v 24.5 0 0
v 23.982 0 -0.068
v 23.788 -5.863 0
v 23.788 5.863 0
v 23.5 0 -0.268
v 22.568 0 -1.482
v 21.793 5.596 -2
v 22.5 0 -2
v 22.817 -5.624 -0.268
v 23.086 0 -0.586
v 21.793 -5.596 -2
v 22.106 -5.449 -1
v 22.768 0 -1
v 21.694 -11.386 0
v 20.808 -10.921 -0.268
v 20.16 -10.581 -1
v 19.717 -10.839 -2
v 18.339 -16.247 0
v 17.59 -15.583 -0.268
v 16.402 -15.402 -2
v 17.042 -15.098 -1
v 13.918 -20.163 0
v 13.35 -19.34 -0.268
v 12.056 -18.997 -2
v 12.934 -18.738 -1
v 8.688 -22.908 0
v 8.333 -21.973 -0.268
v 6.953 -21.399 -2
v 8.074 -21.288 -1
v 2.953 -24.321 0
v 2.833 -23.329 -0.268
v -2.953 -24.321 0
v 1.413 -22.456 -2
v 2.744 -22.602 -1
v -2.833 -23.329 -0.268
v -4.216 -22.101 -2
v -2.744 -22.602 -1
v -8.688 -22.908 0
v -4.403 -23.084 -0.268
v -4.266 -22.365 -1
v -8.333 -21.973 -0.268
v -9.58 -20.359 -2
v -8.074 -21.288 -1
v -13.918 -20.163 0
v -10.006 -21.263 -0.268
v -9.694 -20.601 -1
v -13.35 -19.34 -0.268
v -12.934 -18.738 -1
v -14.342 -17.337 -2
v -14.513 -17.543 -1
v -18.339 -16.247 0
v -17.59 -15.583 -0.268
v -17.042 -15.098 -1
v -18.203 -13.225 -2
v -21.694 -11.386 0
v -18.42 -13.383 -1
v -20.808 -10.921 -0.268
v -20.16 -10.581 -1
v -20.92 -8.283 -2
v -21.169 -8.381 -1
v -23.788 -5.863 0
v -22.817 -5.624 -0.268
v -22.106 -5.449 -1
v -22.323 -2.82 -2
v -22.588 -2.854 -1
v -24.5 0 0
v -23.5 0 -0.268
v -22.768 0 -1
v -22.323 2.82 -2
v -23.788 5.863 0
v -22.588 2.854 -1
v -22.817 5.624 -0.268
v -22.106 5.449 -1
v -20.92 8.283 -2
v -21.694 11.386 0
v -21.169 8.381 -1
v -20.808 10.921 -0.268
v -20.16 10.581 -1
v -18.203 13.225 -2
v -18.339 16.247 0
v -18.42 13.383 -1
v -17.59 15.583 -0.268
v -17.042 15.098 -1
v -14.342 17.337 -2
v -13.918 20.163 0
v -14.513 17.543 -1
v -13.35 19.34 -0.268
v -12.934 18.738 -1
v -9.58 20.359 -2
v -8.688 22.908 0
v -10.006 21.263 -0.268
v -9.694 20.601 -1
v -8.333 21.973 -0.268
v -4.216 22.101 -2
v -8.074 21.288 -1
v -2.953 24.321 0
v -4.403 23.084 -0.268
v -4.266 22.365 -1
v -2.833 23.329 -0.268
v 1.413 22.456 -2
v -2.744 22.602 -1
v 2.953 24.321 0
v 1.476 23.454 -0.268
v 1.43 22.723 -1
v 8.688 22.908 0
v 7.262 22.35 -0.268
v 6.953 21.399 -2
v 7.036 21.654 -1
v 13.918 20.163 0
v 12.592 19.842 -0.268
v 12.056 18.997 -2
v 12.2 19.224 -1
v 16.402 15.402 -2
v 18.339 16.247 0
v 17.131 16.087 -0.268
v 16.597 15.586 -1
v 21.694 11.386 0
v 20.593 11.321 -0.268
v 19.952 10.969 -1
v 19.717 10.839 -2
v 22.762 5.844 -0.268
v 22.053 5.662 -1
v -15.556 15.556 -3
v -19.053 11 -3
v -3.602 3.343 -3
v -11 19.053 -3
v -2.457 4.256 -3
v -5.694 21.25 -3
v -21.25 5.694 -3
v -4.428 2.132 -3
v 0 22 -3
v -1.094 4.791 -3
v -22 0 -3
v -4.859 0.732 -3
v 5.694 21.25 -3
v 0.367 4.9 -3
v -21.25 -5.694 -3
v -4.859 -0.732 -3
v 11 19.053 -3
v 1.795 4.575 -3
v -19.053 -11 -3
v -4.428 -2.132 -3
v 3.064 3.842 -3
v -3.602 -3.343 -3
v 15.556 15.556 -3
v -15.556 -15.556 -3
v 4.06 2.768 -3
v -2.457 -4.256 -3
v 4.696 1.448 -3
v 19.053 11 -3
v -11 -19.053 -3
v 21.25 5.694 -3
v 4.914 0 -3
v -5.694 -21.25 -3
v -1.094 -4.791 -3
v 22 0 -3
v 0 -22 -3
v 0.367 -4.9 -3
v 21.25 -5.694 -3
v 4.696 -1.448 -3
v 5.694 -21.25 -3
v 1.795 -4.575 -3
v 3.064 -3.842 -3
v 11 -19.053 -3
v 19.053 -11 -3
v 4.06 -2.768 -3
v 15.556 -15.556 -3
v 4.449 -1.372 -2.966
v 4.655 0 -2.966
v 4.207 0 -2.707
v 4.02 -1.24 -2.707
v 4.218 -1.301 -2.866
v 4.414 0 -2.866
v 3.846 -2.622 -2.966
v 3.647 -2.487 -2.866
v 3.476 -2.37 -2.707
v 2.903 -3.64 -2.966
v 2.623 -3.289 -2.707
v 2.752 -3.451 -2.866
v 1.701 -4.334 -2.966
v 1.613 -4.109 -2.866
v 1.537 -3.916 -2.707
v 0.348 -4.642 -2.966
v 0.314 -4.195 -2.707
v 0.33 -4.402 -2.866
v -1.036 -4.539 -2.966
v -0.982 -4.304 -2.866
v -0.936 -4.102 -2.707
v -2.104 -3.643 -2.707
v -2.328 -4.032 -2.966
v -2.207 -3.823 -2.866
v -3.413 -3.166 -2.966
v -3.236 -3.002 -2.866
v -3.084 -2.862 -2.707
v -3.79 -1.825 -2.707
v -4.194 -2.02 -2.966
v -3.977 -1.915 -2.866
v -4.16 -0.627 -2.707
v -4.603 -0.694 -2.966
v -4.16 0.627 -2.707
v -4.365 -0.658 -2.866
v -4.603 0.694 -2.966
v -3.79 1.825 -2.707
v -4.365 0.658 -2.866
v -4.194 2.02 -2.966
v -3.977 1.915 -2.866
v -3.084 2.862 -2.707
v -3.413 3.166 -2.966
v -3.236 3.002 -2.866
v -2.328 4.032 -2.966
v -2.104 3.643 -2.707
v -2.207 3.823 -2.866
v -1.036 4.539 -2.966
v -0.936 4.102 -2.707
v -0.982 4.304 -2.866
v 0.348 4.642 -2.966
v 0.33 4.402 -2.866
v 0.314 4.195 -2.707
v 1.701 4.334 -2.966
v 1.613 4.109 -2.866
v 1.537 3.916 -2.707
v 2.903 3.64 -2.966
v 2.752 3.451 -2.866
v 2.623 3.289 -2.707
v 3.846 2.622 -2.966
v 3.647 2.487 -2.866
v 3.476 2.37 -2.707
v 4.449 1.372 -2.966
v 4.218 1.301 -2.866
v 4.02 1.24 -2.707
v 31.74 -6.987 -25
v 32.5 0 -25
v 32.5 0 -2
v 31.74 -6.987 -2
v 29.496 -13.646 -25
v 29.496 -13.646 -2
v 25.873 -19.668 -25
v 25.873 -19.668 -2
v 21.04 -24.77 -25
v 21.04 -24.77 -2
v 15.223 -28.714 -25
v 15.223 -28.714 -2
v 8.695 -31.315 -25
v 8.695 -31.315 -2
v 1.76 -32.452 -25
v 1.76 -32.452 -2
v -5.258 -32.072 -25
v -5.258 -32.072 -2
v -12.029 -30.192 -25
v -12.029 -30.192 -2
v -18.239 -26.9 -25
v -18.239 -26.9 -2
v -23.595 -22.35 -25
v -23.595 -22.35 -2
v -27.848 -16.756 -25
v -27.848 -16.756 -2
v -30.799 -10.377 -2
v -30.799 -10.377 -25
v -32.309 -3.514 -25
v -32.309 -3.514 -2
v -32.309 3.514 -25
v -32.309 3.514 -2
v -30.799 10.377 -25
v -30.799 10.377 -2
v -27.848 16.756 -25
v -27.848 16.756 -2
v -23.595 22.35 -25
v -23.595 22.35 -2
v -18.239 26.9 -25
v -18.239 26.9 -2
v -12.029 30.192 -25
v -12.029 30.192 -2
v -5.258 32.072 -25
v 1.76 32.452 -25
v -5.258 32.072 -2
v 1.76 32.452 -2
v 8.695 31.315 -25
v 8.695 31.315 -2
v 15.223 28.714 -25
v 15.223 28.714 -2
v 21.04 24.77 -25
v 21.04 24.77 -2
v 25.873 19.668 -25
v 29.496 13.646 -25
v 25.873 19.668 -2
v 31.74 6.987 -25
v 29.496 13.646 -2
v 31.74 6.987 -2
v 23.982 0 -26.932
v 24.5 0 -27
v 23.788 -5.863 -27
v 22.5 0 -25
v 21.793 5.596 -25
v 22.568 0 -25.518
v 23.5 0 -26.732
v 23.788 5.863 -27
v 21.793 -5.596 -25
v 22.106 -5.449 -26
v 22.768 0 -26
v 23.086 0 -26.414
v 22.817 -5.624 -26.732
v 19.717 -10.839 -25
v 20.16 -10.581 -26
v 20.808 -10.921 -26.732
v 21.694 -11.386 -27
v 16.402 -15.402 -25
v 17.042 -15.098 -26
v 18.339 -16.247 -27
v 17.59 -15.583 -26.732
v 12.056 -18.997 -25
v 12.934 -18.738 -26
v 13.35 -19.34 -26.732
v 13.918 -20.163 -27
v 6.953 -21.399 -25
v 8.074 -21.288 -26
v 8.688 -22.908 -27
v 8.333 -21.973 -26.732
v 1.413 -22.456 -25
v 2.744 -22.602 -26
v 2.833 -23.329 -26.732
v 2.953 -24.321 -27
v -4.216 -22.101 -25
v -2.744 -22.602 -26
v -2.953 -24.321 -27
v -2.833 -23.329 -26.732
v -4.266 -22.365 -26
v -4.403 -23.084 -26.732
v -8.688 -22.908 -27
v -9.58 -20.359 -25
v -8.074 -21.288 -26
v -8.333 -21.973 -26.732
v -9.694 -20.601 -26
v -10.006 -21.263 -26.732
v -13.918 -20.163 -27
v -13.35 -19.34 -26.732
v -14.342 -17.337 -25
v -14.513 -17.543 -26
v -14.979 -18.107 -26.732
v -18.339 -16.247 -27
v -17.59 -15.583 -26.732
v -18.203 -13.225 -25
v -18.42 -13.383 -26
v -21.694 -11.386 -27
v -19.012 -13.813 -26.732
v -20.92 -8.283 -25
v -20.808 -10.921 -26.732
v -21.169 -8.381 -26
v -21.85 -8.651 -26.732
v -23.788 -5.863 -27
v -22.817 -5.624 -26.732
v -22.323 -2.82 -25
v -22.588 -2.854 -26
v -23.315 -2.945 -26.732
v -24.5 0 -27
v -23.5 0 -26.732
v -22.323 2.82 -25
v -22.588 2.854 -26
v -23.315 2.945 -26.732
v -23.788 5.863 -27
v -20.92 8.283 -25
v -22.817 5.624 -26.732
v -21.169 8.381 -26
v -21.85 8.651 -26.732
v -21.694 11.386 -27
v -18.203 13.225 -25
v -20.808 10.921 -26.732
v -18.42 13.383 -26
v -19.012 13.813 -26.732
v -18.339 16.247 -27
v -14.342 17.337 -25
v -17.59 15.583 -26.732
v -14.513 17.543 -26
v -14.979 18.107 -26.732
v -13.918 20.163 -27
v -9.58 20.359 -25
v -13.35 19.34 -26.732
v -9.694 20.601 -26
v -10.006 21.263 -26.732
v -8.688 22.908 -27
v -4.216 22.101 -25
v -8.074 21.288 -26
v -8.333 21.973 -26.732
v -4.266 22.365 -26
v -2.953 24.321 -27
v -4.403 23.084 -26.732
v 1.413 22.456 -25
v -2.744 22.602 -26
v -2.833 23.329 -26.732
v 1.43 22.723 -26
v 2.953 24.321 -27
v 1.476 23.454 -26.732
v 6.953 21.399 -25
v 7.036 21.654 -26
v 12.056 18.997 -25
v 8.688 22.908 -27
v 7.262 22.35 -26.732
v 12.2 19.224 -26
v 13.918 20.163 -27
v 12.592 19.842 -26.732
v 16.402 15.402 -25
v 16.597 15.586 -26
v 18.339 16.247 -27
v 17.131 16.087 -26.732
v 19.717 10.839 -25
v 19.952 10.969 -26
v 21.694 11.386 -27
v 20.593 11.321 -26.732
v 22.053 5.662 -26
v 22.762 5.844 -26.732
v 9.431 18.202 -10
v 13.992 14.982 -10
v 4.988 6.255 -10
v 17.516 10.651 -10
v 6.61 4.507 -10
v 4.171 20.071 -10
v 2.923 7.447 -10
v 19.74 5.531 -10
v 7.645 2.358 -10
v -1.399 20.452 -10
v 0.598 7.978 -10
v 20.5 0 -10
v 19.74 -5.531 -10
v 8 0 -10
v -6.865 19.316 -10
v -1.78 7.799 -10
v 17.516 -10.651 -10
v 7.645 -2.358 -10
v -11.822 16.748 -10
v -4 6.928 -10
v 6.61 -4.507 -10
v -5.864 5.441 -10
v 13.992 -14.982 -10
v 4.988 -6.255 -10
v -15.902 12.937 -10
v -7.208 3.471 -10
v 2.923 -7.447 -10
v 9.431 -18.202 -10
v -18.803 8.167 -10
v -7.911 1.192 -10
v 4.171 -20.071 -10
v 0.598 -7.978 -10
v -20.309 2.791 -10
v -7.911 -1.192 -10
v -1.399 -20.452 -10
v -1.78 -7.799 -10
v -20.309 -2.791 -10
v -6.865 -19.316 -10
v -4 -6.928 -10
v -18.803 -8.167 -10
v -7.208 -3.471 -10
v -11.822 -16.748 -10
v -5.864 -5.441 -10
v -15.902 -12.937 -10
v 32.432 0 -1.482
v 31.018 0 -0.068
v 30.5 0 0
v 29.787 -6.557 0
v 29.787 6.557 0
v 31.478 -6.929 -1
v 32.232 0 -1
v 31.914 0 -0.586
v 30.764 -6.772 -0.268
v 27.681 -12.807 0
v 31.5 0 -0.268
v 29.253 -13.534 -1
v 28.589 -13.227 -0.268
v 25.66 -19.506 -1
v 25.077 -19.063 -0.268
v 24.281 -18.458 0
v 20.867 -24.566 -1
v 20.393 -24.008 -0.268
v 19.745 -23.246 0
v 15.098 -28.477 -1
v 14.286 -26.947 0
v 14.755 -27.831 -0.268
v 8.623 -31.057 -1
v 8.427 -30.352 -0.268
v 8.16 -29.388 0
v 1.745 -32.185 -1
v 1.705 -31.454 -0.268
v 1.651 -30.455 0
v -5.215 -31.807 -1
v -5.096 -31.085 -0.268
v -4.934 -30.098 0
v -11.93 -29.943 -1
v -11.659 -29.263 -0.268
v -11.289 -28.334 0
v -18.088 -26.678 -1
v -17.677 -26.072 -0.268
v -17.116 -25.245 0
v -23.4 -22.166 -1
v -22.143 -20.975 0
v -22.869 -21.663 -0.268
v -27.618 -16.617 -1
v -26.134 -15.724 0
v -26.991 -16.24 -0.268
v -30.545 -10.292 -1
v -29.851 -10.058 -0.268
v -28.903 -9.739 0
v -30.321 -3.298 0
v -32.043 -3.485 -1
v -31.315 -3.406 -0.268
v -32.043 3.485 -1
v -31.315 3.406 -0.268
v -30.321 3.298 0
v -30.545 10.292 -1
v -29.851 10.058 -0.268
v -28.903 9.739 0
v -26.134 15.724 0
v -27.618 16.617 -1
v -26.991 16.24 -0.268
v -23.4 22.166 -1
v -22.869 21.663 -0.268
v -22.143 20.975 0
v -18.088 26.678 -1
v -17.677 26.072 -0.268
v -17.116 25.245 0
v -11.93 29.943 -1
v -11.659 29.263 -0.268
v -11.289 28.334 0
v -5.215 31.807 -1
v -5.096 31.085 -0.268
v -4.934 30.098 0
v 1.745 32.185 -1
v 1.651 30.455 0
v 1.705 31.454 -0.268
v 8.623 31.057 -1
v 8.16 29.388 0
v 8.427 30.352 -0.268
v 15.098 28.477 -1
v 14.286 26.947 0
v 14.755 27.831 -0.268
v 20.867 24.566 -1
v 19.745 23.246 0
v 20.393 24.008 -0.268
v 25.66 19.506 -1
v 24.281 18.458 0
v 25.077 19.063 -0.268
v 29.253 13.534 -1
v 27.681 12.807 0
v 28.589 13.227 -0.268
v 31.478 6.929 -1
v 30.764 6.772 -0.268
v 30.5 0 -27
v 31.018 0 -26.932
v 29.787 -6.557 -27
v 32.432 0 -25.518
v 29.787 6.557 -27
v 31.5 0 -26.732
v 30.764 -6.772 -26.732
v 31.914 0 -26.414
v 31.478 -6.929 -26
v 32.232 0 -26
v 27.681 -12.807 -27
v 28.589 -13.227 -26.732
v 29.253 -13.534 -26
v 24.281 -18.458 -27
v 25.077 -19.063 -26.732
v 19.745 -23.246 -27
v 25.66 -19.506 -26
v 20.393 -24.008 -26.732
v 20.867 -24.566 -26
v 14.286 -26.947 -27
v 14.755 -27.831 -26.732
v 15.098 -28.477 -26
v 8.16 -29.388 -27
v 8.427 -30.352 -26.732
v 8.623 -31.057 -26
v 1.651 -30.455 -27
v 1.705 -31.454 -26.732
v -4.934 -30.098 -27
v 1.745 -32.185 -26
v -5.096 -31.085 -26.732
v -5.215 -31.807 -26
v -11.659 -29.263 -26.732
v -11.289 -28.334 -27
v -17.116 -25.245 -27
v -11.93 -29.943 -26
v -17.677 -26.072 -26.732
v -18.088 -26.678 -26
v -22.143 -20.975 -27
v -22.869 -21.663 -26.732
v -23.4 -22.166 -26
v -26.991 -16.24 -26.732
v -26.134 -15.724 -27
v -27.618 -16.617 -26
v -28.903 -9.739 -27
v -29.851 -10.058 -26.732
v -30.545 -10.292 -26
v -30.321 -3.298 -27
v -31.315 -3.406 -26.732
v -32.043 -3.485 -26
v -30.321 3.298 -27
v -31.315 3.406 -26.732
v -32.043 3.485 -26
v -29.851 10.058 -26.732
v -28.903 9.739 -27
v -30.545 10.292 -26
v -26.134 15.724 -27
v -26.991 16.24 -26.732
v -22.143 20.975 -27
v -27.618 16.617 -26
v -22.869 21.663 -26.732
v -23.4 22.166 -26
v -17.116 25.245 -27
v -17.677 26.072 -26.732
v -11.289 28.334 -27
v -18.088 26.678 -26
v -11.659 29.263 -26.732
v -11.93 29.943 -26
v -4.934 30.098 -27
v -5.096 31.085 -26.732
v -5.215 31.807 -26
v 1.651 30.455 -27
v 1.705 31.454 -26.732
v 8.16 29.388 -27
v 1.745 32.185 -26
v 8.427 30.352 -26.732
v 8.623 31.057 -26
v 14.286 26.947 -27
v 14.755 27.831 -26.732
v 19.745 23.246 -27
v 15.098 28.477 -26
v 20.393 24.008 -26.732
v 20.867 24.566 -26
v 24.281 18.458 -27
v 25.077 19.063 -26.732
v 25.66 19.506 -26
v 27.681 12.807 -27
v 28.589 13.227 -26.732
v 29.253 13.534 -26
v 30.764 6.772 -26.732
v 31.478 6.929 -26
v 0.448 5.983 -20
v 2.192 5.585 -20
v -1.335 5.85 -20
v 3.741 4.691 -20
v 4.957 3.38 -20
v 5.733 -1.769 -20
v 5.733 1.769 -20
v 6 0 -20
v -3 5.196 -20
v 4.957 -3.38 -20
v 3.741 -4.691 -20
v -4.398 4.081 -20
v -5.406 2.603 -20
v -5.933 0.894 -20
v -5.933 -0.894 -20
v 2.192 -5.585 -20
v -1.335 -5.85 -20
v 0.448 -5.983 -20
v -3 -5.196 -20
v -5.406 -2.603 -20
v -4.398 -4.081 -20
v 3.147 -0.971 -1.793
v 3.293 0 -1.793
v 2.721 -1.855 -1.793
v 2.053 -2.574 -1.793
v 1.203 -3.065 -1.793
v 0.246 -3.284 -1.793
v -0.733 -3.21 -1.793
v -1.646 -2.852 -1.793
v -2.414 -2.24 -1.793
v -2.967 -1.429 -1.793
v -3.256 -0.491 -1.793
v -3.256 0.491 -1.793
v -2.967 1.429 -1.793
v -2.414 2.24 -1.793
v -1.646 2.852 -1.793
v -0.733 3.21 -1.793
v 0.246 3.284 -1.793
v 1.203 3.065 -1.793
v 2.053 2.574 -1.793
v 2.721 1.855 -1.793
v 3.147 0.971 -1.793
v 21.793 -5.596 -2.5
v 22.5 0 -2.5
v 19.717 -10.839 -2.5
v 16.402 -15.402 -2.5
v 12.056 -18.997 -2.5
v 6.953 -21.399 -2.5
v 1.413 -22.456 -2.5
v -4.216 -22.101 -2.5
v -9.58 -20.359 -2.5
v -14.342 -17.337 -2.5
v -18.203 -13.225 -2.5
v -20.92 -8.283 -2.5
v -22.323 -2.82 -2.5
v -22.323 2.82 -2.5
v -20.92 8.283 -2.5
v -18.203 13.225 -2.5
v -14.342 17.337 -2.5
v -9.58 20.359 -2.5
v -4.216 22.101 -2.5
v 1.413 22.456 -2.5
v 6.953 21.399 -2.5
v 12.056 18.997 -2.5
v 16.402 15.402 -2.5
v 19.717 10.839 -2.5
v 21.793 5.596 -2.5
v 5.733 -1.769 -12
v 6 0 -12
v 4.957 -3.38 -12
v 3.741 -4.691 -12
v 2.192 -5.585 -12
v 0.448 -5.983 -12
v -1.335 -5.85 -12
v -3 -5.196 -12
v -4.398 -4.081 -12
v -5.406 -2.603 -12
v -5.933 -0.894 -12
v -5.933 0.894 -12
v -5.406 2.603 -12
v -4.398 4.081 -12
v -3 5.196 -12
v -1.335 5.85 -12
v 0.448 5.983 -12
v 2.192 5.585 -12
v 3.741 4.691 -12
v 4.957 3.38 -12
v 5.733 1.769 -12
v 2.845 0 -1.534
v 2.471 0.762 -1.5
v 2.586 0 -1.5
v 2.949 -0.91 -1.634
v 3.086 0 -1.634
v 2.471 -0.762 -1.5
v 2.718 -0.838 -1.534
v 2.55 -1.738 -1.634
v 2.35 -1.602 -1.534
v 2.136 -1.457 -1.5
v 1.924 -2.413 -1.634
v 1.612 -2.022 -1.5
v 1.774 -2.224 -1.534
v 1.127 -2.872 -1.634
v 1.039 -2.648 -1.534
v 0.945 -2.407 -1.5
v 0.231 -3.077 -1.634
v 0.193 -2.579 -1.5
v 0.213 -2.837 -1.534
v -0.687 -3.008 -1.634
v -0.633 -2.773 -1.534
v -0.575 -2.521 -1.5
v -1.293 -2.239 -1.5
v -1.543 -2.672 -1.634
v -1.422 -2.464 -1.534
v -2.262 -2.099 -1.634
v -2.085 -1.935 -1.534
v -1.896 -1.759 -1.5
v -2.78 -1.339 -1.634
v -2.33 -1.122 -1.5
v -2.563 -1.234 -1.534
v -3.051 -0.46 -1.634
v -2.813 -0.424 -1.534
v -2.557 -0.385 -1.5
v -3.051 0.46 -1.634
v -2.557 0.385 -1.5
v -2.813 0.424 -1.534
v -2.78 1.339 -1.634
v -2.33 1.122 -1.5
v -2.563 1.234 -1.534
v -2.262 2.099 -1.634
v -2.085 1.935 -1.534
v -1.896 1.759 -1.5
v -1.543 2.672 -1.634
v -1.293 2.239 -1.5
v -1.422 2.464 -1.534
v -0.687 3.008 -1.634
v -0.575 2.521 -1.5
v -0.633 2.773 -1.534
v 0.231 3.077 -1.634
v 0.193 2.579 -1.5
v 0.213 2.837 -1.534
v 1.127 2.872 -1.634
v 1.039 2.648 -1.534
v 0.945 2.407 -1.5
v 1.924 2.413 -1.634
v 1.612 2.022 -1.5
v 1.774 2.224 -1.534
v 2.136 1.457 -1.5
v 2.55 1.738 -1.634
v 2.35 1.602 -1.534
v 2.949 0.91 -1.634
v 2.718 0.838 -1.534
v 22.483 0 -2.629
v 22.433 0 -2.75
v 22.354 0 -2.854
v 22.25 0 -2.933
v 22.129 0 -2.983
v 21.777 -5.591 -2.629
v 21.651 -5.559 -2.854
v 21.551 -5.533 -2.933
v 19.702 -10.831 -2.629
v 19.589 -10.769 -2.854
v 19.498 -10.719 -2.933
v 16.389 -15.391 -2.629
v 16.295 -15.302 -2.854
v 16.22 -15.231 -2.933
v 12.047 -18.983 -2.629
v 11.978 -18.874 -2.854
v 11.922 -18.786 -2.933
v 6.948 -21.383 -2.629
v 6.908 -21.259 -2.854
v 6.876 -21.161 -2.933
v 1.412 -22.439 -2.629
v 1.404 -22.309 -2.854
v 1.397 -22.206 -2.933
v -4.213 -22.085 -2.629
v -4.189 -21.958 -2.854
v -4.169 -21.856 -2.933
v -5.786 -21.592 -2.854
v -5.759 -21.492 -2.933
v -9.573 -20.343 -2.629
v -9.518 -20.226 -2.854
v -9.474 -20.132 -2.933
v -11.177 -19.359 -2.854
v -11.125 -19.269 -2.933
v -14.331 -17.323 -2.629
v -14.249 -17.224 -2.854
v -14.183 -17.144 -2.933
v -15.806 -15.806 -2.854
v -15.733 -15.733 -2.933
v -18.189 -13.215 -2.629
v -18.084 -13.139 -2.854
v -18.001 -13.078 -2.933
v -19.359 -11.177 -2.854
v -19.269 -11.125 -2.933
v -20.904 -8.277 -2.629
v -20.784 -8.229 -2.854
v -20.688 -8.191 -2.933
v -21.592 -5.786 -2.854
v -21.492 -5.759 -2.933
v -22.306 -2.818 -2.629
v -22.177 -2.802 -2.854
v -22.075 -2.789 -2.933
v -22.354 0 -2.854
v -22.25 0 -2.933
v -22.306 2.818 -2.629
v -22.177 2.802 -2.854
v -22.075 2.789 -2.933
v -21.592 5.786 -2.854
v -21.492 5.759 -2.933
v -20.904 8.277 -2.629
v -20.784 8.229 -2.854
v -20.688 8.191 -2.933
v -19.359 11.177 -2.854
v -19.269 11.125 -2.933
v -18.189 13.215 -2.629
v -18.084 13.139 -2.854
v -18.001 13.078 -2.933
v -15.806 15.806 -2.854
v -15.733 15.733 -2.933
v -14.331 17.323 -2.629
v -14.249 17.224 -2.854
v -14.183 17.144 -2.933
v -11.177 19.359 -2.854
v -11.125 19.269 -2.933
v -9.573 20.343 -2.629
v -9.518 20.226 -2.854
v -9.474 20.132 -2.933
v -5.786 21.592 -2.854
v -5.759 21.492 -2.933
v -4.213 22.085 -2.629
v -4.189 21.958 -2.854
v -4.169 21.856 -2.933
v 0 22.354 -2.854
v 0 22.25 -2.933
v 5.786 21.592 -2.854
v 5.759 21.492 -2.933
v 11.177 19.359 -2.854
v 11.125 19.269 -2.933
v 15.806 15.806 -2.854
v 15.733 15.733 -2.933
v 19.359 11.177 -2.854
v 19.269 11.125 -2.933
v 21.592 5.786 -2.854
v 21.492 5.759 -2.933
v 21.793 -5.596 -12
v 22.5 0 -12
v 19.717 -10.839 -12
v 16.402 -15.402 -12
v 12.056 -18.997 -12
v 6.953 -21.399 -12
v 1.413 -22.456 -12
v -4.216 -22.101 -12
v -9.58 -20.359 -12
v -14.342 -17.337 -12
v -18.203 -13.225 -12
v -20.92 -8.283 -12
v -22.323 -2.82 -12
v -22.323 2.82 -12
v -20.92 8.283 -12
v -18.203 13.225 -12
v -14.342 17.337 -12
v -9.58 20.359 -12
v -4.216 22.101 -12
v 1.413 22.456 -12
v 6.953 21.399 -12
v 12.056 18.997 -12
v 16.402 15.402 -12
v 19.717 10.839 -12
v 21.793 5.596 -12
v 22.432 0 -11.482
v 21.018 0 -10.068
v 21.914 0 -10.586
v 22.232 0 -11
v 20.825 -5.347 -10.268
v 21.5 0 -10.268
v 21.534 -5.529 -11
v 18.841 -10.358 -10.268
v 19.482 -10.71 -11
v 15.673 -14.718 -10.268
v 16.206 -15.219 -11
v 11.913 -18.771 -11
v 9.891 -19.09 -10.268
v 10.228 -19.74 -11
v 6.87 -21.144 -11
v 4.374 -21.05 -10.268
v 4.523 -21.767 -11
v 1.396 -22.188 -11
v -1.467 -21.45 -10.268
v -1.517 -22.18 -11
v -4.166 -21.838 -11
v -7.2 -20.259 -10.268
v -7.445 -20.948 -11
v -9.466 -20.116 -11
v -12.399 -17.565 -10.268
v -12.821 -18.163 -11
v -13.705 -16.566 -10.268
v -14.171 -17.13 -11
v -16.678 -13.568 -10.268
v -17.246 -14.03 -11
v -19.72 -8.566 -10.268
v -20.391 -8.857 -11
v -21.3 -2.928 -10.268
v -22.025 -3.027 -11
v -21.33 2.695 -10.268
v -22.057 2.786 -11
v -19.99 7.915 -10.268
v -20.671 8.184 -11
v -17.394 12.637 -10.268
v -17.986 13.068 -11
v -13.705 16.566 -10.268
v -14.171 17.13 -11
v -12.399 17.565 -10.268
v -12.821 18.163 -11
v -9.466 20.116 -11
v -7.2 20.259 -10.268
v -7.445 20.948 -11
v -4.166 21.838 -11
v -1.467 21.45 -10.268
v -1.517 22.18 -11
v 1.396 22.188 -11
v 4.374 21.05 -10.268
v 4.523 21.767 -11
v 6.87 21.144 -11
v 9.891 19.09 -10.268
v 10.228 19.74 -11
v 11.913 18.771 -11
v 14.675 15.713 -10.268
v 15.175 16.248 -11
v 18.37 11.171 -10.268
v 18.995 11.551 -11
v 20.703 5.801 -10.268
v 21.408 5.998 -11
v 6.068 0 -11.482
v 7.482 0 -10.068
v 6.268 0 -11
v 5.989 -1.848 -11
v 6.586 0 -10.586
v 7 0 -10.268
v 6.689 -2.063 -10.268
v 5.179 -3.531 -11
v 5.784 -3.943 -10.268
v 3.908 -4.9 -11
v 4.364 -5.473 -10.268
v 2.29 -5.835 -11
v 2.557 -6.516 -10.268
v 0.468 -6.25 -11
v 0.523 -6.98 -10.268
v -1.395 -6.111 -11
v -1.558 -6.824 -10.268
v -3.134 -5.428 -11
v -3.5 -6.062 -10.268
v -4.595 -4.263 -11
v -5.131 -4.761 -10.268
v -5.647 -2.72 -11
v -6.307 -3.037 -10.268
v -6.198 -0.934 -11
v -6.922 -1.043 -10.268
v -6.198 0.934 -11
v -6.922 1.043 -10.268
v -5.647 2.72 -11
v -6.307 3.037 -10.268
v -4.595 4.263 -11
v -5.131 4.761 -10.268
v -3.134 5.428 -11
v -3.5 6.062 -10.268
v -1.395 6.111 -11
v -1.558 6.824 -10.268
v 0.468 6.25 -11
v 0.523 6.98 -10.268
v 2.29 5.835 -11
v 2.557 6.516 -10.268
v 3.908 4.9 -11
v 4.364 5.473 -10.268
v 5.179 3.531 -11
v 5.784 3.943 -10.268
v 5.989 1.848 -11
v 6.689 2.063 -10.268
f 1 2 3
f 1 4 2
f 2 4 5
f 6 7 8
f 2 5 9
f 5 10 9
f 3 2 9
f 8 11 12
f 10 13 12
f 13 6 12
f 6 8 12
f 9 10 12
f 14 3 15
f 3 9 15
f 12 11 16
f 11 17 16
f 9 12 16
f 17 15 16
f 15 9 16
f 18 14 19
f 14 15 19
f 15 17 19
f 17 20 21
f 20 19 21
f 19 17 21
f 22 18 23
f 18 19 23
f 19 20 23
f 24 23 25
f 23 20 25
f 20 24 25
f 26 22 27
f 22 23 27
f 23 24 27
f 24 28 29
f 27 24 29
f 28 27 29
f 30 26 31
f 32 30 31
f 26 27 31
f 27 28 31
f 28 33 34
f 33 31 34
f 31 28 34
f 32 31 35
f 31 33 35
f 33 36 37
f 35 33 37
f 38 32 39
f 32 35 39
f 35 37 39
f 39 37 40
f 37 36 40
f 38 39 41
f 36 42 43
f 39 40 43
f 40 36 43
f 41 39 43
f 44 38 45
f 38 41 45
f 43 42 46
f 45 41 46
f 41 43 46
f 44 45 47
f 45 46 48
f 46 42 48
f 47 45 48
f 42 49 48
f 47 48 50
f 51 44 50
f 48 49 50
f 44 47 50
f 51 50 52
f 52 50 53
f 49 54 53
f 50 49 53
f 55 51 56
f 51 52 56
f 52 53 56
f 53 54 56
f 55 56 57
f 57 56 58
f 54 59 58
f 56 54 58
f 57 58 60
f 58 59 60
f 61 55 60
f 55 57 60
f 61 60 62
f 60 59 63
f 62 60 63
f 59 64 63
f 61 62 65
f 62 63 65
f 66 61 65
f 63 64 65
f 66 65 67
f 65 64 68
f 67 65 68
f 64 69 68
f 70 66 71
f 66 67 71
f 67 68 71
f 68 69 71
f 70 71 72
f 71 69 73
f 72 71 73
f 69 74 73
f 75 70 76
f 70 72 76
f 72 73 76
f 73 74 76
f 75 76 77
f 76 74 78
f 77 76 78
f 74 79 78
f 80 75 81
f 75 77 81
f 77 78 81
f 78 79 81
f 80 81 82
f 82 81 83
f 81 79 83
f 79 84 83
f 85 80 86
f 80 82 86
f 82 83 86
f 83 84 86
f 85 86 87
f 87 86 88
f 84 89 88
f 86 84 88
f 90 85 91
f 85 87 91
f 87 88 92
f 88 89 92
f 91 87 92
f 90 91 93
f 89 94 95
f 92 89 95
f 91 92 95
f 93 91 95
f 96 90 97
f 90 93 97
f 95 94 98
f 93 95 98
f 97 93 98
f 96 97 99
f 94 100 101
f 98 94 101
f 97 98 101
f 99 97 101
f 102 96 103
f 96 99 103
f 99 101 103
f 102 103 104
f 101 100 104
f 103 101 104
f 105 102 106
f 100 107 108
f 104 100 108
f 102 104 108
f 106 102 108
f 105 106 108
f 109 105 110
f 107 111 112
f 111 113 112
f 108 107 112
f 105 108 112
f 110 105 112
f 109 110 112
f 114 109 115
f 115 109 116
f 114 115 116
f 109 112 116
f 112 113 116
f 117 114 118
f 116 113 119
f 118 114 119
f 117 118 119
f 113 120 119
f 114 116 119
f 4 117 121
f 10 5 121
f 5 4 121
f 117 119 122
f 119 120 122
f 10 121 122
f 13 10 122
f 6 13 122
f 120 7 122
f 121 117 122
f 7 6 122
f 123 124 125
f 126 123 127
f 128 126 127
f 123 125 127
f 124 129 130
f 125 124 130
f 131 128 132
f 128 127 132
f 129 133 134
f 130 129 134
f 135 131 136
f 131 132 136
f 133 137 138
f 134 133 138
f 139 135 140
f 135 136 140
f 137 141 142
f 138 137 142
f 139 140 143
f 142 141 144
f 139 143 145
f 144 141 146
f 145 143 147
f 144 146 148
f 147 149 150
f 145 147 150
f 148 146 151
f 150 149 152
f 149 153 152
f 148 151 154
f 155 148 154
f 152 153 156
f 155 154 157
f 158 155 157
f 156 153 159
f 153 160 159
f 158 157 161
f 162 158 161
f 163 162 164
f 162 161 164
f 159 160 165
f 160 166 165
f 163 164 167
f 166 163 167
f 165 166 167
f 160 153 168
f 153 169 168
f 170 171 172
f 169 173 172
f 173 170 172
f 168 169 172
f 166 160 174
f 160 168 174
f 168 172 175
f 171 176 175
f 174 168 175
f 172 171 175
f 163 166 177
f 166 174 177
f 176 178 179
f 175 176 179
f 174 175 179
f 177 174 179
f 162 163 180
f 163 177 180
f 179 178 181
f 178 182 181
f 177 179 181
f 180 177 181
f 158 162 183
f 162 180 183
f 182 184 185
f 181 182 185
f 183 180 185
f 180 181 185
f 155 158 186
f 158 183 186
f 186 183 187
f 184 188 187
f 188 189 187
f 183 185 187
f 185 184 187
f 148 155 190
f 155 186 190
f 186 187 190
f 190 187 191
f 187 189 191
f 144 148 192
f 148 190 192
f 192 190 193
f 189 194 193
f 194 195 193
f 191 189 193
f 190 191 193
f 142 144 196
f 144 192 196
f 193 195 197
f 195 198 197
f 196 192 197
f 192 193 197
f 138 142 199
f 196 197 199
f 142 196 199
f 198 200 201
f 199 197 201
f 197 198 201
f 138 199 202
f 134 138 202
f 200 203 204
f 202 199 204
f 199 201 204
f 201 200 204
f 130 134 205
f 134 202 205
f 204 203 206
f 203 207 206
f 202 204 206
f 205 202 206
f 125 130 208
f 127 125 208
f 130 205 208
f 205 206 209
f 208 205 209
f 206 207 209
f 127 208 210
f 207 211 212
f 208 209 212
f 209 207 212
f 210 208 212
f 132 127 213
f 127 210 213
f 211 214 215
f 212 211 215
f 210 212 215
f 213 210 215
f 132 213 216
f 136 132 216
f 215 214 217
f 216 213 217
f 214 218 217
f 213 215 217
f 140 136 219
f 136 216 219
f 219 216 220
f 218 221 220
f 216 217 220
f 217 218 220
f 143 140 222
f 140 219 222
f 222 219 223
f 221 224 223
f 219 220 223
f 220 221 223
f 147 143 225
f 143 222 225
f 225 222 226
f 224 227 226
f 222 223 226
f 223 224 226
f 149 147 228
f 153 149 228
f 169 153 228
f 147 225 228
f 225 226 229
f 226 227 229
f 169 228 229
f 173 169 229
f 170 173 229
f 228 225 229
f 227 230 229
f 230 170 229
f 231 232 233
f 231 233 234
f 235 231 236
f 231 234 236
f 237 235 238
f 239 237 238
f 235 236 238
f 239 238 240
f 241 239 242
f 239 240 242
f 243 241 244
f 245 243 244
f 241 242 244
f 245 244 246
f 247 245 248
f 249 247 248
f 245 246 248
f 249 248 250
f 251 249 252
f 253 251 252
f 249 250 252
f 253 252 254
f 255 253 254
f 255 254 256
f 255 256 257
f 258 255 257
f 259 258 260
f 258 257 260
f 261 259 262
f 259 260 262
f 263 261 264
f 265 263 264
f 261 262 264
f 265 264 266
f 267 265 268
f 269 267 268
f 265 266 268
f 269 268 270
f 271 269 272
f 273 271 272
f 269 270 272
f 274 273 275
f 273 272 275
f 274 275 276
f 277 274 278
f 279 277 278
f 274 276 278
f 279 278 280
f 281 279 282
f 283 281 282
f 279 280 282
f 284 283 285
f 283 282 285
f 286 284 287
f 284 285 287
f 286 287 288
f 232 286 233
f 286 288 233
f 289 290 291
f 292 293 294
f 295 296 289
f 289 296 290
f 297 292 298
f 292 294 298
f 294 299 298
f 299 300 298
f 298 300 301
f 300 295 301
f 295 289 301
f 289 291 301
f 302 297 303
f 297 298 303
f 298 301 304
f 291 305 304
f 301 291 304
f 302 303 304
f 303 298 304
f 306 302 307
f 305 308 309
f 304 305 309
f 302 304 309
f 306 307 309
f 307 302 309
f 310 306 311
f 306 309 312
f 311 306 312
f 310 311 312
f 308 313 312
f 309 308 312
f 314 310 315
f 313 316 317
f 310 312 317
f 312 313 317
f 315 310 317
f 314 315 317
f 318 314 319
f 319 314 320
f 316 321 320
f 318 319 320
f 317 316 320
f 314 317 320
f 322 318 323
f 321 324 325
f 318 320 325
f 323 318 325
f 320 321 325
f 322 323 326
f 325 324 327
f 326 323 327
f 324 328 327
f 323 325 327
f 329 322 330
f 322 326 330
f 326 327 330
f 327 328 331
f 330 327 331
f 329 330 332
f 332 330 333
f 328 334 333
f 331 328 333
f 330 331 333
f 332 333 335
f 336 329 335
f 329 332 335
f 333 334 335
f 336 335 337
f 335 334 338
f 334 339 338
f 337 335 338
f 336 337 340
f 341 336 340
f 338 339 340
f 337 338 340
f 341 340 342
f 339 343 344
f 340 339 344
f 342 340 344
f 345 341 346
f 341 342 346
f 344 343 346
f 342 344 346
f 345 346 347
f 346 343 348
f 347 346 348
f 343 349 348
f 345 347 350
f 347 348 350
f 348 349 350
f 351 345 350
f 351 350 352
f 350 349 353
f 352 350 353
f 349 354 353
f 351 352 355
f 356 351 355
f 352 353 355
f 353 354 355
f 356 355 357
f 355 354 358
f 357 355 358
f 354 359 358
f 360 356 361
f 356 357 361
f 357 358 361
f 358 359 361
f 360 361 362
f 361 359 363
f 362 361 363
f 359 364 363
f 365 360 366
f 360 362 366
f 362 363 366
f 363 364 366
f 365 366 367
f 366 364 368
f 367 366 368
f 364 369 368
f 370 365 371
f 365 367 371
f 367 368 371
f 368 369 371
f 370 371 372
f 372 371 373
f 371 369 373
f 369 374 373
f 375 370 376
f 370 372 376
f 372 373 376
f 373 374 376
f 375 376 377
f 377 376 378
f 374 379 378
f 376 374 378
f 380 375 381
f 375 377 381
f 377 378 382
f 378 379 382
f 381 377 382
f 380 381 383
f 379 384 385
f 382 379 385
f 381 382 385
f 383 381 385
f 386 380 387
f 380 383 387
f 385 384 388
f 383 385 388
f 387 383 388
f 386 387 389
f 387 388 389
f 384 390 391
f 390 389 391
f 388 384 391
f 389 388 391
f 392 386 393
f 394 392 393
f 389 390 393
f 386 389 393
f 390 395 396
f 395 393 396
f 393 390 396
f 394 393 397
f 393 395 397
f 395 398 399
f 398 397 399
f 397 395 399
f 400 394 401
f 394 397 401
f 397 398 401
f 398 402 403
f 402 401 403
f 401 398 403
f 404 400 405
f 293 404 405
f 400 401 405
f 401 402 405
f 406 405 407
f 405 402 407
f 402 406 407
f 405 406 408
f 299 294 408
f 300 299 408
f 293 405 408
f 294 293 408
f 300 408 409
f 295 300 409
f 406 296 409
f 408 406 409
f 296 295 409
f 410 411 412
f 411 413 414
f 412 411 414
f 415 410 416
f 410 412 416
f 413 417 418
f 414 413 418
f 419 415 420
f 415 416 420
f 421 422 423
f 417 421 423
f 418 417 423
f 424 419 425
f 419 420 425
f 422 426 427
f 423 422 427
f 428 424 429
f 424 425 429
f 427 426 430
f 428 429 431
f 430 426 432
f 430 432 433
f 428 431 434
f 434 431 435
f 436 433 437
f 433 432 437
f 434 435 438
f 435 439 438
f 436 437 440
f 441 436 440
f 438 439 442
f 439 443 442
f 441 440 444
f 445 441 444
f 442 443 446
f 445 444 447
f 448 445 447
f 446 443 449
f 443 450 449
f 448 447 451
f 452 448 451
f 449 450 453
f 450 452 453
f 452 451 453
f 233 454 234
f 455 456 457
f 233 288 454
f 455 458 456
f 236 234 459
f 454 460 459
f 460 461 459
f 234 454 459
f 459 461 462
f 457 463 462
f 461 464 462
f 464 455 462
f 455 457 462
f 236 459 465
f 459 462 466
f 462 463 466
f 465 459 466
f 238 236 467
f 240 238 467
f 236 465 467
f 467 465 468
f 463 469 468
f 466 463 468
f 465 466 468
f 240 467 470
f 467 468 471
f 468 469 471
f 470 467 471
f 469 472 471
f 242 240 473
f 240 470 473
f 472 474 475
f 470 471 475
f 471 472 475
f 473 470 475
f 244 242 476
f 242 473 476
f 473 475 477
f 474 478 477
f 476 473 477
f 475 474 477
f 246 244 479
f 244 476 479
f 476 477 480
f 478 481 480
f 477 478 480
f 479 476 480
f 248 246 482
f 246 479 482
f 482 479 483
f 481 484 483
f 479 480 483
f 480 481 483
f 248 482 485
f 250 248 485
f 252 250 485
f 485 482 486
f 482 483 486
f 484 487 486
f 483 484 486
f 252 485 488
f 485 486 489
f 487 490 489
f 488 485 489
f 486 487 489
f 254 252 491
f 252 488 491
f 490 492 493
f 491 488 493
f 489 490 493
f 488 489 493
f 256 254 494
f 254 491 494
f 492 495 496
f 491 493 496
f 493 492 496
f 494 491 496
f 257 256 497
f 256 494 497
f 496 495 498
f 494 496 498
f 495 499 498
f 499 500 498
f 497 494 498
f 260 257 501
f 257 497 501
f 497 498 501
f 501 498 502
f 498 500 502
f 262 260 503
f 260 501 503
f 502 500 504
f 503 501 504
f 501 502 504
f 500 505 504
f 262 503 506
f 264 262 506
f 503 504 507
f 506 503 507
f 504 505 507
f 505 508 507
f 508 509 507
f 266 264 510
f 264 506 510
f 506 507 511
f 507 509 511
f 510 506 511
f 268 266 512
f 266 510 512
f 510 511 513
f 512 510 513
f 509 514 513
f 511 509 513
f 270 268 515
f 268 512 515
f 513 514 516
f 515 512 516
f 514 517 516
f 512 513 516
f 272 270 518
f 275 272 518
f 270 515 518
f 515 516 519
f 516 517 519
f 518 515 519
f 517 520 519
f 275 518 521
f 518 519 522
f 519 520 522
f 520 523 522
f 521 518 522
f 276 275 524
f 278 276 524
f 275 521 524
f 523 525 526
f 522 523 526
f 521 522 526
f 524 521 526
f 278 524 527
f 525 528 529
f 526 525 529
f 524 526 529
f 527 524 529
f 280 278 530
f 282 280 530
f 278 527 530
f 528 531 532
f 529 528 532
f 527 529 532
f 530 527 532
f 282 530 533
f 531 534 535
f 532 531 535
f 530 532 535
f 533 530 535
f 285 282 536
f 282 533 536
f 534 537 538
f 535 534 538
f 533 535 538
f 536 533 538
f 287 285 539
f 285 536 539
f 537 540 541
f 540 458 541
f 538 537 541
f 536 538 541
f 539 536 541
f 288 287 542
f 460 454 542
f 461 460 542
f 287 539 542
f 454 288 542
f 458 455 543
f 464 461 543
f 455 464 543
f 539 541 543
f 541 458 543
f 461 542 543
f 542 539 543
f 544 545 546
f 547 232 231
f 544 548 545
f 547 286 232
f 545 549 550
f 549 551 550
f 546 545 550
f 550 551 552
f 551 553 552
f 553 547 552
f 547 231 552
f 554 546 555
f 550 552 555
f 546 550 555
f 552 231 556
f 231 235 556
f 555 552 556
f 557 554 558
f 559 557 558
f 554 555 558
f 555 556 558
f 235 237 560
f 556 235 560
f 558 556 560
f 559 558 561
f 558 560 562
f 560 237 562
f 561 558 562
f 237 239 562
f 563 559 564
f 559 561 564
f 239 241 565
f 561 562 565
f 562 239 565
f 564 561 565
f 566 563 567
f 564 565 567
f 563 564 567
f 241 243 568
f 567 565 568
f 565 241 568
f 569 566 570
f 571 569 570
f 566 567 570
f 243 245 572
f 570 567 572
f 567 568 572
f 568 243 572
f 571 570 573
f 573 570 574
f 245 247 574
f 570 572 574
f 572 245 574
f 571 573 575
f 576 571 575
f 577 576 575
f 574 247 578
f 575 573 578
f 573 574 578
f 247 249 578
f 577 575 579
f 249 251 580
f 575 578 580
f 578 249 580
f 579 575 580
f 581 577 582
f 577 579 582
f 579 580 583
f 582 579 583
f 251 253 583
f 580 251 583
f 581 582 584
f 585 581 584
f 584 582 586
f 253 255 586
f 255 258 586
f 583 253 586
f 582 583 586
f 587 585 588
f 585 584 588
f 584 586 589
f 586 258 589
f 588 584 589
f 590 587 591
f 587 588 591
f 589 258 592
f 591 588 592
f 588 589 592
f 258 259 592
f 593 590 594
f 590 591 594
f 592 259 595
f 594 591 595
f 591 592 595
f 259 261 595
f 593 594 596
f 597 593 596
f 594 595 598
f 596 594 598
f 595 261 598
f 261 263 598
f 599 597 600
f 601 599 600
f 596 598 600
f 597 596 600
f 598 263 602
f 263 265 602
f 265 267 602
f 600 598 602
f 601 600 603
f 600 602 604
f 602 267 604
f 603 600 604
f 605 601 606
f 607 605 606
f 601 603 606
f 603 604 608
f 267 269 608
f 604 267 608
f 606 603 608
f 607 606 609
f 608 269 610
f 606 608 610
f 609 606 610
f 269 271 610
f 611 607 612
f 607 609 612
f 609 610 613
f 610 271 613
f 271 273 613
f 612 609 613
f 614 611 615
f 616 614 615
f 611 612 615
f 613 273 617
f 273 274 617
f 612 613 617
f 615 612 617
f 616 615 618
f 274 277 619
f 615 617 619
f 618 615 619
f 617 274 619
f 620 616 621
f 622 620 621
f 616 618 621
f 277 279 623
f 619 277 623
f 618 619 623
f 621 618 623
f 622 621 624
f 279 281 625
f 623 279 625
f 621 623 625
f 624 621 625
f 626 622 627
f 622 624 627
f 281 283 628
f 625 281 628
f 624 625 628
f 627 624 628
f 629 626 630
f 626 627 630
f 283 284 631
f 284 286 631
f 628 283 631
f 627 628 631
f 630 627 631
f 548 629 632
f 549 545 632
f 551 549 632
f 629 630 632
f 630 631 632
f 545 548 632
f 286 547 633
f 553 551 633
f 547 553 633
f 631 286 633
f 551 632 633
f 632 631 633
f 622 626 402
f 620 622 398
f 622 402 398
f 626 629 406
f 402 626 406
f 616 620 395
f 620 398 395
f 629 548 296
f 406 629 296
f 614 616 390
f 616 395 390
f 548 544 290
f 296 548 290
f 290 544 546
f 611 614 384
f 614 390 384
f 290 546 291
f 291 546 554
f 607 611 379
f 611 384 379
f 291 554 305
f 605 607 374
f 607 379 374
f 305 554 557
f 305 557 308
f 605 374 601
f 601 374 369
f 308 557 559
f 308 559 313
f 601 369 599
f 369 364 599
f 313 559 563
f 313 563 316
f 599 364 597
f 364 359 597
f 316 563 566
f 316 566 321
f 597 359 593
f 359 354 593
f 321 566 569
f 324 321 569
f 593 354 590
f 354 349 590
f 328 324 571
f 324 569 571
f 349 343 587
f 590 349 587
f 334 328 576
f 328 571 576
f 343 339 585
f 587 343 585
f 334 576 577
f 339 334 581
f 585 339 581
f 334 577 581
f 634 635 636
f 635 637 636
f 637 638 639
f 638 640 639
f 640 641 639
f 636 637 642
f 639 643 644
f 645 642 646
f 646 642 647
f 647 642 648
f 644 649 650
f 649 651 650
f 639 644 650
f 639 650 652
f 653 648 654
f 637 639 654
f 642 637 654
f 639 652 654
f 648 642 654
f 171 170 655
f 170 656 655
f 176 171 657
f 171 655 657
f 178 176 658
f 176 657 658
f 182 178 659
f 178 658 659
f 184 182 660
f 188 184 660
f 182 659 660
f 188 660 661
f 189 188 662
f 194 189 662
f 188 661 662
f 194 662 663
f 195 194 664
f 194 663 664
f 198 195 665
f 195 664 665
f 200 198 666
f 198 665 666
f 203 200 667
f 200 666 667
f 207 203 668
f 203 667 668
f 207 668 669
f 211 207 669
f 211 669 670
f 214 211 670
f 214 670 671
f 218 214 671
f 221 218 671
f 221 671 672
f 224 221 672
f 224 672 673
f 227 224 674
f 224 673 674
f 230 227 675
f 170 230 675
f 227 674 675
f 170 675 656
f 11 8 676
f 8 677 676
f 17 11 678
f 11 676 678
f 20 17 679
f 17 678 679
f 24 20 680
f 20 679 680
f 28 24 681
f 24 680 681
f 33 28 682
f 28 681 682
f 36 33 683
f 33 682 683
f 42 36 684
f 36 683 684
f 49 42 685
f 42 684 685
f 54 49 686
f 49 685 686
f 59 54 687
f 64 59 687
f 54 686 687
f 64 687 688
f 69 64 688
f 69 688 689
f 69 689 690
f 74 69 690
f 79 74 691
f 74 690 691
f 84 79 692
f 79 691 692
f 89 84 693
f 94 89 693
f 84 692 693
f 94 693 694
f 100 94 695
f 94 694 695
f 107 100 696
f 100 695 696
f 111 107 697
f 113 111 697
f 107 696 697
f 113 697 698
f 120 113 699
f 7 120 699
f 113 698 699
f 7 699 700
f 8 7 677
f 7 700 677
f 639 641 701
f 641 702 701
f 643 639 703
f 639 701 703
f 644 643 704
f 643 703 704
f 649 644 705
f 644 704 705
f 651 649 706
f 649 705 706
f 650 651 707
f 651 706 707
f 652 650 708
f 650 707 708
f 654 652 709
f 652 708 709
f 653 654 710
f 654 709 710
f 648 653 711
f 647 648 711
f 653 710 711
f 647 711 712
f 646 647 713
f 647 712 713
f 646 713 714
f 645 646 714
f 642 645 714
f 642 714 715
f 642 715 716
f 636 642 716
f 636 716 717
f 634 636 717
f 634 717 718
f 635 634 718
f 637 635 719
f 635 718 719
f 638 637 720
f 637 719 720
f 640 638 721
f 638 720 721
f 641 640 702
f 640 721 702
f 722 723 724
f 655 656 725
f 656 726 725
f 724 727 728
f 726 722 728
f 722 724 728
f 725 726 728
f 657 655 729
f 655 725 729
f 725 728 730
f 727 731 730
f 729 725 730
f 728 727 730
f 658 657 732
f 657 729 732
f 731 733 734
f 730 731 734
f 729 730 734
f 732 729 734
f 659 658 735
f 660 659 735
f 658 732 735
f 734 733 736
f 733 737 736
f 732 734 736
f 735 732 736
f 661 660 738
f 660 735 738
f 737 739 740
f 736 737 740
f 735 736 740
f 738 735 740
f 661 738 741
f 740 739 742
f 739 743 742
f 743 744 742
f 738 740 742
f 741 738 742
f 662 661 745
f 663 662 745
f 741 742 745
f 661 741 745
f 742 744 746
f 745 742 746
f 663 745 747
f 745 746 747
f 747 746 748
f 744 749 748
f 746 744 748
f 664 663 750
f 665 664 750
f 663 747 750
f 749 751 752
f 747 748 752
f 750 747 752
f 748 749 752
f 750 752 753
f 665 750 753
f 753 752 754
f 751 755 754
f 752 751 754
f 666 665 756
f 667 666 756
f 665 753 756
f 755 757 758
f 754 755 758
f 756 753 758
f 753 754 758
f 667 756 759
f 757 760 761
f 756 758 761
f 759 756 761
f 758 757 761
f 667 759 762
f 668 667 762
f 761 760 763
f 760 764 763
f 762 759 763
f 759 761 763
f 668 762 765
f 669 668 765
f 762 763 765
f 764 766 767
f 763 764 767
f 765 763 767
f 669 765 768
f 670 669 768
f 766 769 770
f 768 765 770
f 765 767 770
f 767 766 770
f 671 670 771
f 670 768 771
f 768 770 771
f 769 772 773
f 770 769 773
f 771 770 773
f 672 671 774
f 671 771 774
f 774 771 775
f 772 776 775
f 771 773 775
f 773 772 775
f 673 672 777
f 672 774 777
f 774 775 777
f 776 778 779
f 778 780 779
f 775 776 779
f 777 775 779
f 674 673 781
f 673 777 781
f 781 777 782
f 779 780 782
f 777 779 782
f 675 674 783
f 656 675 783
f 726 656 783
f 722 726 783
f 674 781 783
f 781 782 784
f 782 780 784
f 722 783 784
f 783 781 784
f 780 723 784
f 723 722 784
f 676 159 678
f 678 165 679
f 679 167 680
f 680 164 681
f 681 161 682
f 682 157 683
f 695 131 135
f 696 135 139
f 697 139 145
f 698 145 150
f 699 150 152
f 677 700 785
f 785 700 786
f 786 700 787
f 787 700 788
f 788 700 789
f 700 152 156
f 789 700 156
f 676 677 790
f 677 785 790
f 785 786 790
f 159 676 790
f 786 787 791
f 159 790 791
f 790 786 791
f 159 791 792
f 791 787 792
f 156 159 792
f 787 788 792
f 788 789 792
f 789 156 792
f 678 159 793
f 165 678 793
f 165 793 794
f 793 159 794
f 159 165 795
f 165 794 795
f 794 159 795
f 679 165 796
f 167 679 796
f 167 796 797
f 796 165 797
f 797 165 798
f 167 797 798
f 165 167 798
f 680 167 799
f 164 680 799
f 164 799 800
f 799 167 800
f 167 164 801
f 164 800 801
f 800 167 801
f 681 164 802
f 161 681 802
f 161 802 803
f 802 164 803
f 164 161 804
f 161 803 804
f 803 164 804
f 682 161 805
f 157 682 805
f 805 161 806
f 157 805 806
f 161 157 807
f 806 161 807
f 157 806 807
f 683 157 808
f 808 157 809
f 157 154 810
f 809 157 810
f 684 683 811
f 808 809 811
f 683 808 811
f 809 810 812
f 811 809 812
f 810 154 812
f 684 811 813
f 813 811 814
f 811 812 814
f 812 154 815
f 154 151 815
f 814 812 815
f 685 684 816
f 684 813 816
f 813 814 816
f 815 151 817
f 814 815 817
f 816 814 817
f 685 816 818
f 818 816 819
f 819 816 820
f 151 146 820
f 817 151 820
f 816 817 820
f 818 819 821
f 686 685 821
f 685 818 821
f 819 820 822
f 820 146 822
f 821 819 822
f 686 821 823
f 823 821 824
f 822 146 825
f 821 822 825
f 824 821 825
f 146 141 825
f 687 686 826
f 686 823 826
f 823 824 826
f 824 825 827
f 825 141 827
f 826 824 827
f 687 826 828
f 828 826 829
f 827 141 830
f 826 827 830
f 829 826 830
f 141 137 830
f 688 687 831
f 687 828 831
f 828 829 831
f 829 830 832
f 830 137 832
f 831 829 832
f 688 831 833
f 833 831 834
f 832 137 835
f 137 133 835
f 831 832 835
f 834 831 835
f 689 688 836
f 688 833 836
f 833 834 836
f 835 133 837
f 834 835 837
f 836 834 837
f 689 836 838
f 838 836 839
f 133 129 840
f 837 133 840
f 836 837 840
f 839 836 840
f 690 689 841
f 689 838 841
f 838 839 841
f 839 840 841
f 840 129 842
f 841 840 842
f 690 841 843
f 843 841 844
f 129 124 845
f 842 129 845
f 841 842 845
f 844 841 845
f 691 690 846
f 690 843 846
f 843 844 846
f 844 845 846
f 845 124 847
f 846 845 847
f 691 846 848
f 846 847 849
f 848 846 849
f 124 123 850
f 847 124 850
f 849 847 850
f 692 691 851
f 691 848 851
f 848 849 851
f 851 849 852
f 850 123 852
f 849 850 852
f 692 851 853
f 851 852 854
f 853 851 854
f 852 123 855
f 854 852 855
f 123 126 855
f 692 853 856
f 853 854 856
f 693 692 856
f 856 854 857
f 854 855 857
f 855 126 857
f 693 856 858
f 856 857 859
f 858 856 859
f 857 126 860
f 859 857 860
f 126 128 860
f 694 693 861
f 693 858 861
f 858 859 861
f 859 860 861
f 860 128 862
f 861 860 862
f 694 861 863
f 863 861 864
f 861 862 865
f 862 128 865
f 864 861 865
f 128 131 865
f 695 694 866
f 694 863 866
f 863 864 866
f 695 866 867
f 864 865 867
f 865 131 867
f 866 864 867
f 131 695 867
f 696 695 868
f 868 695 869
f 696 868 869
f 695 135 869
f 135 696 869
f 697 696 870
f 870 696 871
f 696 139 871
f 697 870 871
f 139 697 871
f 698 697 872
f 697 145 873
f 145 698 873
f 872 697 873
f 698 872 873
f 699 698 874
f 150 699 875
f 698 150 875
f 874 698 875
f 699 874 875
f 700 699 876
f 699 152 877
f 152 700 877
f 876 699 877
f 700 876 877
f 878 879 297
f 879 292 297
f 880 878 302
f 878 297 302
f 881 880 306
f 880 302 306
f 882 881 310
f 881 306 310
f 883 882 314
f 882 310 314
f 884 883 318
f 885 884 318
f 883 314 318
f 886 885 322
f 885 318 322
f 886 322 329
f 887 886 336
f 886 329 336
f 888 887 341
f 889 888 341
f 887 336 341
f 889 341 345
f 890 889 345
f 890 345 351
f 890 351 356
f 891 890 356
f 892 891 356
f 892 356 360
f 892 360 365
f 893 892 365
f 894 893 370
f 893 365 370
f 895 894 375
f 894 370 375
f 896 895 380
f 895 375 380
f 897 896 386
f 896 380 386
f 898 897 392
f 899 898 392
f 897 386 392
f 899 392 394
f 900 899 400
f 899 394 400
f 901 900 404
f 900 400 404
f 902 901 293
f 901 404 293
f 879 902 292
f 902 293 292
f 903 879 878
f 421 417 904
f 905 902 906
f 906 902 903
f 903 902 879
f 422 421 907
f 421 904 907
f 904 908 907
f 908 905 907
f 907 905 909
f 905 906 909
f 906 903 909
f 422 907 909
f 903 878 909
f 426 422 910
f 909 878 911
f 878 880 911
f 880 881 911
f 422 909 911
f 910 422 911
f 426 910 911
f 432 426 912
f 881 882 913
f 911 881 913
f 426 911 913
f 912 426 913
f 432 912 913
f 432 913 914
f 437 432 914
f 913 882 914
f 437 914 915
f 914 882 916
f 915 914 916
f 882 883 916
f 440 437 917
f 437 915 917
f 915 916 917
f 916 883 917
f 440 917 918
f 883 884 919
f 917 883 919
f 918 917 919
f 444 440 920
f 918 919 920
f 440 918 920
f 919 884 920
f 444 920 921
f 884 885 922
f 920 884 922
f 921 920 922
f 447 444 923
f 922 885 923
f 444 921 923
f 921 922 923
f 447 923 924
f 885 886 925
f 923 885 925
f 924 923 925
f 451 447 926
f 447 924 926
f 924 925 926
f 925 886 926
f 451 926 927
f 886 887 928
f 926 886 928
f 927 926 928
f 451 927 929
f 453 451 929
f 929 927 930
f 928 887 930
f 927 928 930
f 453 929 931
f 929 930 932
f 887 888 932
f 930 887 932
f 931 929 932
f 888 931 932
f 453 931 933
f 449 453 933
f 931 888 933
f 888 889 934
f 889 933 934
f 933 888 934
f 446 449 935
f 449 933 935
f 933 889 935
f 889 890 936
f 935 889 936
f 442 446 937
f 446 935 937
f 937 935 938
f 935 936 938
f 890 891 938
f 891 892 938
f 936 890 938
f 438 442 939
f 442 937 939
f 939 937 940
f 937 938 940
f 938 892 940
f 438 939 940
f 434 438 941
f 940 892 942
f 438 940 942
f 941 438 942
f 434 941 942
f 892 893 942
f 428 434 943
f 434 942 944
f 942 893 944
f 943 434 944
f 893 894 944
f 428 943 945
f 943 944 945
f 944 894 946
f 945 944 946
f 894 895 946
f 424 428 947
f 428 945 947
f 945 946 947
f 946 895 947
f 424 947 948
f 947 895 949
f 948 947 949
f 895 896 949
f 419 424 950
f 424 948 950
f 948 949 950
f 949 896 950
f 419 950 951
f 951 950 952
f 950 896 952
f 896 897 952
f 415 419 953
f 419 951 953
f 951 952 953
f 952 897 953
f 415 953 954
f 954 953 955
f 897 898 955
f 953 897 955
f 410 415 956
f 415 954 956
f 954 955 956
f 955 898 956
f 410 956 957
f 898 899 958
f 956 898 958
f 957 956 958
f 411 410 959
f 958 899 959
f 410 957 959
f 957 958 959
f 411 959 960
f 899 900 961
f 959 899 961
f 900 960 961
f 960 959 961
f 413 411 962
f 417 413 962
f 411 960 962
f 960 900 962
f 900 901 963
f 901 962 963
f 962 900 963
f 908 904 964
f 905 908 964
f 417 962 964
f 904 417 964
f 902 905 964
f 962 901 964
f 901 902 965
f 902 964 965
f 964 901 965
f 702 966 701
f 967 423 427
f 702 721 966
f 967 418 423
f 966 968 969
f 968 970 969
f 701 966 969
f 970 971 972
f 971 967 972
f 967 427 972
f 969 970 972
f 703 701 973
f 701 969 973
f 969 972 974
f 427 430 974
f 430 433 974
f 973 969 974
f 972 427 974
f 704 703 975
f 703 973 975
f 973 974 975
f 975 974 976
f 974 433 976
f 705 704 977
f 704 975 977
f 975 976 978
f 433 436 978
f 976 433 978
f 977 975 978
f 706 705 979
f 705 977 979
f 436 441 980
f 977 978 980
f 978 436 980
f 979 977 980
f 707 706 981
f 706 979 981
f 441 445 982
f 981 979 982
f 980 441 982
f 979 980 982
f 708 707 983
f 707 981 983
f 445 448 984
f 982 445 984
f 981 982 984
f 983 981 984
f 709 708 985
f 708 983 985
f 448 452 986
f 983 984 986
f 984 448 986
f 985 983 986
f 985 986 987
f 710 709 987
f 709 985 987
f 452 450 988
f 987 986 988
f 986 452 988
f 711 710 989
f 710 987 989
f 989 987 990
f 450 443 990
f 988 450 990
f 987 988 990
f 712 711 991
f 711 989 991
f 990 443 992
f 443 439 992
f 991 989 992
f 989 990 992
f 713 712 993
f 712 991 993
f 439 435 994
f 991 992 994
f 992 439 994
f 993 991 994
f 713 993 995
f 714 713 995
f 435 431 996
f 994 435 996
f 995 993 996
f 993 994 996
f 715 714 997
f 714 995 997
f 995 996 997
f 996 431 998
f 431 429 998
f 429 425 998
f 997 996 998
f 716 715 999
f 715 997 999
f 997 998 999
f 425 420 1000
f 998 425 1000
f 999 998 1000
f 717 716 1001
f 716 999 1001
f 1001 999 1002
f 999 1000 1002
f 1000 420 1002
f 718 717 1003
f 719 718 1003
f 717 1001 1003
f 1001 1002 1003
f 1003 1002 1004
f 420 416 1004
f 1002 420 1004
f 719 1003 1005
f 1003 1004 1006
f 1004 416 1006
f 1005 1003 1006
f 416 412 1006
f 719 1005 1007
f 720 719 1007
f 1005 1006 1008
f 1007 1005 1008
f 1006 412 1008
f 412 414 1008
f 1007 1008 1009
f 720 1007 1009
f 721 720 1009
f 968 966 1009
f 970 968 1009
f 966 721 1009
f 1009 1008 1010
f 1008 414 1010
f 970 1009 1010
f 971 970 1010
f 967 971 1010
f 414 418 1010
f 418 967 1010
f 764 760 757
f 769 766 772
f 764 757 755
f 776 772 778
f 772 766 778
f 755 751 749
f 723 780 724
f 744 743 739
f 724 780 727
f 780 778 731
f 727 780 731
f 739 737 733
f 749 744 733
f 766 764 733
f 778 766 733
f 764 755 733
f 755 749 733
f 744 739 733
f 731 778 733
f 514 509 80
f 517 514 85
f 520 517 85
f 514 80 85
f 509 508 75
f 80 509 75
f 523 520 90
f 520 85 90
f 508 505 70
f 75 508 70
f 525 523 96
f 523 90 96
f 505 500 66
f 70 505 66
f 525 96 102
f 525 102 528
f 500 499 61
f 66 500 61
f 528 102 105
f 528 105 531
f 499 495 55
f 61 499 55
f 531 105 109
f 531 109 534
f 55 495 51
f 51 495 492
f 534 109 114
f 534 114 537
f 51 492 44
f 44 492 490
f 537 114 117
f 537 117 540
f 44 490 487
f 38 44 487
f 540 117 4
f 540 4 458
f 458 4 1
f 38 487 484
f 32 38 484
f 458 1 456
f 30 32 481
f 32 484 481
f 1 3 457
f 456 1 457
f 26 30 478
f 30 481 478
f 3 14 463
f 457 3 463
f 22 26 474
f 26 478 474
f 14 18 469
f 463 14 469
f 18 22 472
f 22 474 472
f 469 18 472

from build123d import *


with BuildPart() as part:
    # Sketch2 → Revolve1 (revolve)
    with BuildSketch(Plane(origin=(0, 0, 0), x_dir=(1, 0, 0), z_dir=(0, 1, 0)), mode=Mode.PRIVATE) as revolve1_sk:
        with BuildLine():
            Line((-30.5, 0), (-24.5, 0))
            ThreePointArc((-24.5, 0), (-23.085786438, 0.585786438), (-22.5, 2))
            Line((-22.5, 2), (-22.5, 2.5))
            ThreePointArc((-22.5, 2.5), (-22.353553391, 2.853553391), (-22, 3))
            Line((-22, 3), (-4.914213562, 3))
            ThreePointArc((-4.914213562, 3), (-4.53153013, 2.923879533), (-4.207106781, 2.707106781))
            Line((-4.207106781, 2.707106781), (-3.292893219, 1.792893219))
            ThreePointArc((-3.292893219, 1.792893219), (-2.96846987, 1.576120467), (-2.585786438, 1.5))
            Line((-2.585786438, 1.5), (0, 1.5))
            Line((0, 1.5), (0, 20))
            Line((0, 20), (-6, 20))
            Line((-6, 20), (-6, 12))
            ThreePointArc((-6, 12), (-6.585786438, 10.585786438), (-8, 10))
            Line((-8, 10), (-20.5, 10))
            ThreePointArc((-20.5, 10), (-21.914213562, 10.585786438), (-22.5, 12))
            Line((-22.5, 12), (-22.5, 25))
            ThreePointArc((-22.5, 25), (-23.085786438, 26.414213562), (-24.5, 27))
            Line((-24.5, 27), (-30.5, 27))
            ThreePointArc((-30.5, 27), (-31.914213562, 26.414213562), (-32.5, 25))
            Line((-32.5, 25), (-32.5, 2))
            ThreePointArc((-32.5, 2), (-31.914213562, 0.585786438), (-30.5, 0))
        make_face()
    revolve(revolve1_sk.sketch.rotate(Axis((0, 0, 0), (0, 0, -1)), 180), axis=Axis((0, 0, 0), (0, 0, -1)))


solid = part.part
